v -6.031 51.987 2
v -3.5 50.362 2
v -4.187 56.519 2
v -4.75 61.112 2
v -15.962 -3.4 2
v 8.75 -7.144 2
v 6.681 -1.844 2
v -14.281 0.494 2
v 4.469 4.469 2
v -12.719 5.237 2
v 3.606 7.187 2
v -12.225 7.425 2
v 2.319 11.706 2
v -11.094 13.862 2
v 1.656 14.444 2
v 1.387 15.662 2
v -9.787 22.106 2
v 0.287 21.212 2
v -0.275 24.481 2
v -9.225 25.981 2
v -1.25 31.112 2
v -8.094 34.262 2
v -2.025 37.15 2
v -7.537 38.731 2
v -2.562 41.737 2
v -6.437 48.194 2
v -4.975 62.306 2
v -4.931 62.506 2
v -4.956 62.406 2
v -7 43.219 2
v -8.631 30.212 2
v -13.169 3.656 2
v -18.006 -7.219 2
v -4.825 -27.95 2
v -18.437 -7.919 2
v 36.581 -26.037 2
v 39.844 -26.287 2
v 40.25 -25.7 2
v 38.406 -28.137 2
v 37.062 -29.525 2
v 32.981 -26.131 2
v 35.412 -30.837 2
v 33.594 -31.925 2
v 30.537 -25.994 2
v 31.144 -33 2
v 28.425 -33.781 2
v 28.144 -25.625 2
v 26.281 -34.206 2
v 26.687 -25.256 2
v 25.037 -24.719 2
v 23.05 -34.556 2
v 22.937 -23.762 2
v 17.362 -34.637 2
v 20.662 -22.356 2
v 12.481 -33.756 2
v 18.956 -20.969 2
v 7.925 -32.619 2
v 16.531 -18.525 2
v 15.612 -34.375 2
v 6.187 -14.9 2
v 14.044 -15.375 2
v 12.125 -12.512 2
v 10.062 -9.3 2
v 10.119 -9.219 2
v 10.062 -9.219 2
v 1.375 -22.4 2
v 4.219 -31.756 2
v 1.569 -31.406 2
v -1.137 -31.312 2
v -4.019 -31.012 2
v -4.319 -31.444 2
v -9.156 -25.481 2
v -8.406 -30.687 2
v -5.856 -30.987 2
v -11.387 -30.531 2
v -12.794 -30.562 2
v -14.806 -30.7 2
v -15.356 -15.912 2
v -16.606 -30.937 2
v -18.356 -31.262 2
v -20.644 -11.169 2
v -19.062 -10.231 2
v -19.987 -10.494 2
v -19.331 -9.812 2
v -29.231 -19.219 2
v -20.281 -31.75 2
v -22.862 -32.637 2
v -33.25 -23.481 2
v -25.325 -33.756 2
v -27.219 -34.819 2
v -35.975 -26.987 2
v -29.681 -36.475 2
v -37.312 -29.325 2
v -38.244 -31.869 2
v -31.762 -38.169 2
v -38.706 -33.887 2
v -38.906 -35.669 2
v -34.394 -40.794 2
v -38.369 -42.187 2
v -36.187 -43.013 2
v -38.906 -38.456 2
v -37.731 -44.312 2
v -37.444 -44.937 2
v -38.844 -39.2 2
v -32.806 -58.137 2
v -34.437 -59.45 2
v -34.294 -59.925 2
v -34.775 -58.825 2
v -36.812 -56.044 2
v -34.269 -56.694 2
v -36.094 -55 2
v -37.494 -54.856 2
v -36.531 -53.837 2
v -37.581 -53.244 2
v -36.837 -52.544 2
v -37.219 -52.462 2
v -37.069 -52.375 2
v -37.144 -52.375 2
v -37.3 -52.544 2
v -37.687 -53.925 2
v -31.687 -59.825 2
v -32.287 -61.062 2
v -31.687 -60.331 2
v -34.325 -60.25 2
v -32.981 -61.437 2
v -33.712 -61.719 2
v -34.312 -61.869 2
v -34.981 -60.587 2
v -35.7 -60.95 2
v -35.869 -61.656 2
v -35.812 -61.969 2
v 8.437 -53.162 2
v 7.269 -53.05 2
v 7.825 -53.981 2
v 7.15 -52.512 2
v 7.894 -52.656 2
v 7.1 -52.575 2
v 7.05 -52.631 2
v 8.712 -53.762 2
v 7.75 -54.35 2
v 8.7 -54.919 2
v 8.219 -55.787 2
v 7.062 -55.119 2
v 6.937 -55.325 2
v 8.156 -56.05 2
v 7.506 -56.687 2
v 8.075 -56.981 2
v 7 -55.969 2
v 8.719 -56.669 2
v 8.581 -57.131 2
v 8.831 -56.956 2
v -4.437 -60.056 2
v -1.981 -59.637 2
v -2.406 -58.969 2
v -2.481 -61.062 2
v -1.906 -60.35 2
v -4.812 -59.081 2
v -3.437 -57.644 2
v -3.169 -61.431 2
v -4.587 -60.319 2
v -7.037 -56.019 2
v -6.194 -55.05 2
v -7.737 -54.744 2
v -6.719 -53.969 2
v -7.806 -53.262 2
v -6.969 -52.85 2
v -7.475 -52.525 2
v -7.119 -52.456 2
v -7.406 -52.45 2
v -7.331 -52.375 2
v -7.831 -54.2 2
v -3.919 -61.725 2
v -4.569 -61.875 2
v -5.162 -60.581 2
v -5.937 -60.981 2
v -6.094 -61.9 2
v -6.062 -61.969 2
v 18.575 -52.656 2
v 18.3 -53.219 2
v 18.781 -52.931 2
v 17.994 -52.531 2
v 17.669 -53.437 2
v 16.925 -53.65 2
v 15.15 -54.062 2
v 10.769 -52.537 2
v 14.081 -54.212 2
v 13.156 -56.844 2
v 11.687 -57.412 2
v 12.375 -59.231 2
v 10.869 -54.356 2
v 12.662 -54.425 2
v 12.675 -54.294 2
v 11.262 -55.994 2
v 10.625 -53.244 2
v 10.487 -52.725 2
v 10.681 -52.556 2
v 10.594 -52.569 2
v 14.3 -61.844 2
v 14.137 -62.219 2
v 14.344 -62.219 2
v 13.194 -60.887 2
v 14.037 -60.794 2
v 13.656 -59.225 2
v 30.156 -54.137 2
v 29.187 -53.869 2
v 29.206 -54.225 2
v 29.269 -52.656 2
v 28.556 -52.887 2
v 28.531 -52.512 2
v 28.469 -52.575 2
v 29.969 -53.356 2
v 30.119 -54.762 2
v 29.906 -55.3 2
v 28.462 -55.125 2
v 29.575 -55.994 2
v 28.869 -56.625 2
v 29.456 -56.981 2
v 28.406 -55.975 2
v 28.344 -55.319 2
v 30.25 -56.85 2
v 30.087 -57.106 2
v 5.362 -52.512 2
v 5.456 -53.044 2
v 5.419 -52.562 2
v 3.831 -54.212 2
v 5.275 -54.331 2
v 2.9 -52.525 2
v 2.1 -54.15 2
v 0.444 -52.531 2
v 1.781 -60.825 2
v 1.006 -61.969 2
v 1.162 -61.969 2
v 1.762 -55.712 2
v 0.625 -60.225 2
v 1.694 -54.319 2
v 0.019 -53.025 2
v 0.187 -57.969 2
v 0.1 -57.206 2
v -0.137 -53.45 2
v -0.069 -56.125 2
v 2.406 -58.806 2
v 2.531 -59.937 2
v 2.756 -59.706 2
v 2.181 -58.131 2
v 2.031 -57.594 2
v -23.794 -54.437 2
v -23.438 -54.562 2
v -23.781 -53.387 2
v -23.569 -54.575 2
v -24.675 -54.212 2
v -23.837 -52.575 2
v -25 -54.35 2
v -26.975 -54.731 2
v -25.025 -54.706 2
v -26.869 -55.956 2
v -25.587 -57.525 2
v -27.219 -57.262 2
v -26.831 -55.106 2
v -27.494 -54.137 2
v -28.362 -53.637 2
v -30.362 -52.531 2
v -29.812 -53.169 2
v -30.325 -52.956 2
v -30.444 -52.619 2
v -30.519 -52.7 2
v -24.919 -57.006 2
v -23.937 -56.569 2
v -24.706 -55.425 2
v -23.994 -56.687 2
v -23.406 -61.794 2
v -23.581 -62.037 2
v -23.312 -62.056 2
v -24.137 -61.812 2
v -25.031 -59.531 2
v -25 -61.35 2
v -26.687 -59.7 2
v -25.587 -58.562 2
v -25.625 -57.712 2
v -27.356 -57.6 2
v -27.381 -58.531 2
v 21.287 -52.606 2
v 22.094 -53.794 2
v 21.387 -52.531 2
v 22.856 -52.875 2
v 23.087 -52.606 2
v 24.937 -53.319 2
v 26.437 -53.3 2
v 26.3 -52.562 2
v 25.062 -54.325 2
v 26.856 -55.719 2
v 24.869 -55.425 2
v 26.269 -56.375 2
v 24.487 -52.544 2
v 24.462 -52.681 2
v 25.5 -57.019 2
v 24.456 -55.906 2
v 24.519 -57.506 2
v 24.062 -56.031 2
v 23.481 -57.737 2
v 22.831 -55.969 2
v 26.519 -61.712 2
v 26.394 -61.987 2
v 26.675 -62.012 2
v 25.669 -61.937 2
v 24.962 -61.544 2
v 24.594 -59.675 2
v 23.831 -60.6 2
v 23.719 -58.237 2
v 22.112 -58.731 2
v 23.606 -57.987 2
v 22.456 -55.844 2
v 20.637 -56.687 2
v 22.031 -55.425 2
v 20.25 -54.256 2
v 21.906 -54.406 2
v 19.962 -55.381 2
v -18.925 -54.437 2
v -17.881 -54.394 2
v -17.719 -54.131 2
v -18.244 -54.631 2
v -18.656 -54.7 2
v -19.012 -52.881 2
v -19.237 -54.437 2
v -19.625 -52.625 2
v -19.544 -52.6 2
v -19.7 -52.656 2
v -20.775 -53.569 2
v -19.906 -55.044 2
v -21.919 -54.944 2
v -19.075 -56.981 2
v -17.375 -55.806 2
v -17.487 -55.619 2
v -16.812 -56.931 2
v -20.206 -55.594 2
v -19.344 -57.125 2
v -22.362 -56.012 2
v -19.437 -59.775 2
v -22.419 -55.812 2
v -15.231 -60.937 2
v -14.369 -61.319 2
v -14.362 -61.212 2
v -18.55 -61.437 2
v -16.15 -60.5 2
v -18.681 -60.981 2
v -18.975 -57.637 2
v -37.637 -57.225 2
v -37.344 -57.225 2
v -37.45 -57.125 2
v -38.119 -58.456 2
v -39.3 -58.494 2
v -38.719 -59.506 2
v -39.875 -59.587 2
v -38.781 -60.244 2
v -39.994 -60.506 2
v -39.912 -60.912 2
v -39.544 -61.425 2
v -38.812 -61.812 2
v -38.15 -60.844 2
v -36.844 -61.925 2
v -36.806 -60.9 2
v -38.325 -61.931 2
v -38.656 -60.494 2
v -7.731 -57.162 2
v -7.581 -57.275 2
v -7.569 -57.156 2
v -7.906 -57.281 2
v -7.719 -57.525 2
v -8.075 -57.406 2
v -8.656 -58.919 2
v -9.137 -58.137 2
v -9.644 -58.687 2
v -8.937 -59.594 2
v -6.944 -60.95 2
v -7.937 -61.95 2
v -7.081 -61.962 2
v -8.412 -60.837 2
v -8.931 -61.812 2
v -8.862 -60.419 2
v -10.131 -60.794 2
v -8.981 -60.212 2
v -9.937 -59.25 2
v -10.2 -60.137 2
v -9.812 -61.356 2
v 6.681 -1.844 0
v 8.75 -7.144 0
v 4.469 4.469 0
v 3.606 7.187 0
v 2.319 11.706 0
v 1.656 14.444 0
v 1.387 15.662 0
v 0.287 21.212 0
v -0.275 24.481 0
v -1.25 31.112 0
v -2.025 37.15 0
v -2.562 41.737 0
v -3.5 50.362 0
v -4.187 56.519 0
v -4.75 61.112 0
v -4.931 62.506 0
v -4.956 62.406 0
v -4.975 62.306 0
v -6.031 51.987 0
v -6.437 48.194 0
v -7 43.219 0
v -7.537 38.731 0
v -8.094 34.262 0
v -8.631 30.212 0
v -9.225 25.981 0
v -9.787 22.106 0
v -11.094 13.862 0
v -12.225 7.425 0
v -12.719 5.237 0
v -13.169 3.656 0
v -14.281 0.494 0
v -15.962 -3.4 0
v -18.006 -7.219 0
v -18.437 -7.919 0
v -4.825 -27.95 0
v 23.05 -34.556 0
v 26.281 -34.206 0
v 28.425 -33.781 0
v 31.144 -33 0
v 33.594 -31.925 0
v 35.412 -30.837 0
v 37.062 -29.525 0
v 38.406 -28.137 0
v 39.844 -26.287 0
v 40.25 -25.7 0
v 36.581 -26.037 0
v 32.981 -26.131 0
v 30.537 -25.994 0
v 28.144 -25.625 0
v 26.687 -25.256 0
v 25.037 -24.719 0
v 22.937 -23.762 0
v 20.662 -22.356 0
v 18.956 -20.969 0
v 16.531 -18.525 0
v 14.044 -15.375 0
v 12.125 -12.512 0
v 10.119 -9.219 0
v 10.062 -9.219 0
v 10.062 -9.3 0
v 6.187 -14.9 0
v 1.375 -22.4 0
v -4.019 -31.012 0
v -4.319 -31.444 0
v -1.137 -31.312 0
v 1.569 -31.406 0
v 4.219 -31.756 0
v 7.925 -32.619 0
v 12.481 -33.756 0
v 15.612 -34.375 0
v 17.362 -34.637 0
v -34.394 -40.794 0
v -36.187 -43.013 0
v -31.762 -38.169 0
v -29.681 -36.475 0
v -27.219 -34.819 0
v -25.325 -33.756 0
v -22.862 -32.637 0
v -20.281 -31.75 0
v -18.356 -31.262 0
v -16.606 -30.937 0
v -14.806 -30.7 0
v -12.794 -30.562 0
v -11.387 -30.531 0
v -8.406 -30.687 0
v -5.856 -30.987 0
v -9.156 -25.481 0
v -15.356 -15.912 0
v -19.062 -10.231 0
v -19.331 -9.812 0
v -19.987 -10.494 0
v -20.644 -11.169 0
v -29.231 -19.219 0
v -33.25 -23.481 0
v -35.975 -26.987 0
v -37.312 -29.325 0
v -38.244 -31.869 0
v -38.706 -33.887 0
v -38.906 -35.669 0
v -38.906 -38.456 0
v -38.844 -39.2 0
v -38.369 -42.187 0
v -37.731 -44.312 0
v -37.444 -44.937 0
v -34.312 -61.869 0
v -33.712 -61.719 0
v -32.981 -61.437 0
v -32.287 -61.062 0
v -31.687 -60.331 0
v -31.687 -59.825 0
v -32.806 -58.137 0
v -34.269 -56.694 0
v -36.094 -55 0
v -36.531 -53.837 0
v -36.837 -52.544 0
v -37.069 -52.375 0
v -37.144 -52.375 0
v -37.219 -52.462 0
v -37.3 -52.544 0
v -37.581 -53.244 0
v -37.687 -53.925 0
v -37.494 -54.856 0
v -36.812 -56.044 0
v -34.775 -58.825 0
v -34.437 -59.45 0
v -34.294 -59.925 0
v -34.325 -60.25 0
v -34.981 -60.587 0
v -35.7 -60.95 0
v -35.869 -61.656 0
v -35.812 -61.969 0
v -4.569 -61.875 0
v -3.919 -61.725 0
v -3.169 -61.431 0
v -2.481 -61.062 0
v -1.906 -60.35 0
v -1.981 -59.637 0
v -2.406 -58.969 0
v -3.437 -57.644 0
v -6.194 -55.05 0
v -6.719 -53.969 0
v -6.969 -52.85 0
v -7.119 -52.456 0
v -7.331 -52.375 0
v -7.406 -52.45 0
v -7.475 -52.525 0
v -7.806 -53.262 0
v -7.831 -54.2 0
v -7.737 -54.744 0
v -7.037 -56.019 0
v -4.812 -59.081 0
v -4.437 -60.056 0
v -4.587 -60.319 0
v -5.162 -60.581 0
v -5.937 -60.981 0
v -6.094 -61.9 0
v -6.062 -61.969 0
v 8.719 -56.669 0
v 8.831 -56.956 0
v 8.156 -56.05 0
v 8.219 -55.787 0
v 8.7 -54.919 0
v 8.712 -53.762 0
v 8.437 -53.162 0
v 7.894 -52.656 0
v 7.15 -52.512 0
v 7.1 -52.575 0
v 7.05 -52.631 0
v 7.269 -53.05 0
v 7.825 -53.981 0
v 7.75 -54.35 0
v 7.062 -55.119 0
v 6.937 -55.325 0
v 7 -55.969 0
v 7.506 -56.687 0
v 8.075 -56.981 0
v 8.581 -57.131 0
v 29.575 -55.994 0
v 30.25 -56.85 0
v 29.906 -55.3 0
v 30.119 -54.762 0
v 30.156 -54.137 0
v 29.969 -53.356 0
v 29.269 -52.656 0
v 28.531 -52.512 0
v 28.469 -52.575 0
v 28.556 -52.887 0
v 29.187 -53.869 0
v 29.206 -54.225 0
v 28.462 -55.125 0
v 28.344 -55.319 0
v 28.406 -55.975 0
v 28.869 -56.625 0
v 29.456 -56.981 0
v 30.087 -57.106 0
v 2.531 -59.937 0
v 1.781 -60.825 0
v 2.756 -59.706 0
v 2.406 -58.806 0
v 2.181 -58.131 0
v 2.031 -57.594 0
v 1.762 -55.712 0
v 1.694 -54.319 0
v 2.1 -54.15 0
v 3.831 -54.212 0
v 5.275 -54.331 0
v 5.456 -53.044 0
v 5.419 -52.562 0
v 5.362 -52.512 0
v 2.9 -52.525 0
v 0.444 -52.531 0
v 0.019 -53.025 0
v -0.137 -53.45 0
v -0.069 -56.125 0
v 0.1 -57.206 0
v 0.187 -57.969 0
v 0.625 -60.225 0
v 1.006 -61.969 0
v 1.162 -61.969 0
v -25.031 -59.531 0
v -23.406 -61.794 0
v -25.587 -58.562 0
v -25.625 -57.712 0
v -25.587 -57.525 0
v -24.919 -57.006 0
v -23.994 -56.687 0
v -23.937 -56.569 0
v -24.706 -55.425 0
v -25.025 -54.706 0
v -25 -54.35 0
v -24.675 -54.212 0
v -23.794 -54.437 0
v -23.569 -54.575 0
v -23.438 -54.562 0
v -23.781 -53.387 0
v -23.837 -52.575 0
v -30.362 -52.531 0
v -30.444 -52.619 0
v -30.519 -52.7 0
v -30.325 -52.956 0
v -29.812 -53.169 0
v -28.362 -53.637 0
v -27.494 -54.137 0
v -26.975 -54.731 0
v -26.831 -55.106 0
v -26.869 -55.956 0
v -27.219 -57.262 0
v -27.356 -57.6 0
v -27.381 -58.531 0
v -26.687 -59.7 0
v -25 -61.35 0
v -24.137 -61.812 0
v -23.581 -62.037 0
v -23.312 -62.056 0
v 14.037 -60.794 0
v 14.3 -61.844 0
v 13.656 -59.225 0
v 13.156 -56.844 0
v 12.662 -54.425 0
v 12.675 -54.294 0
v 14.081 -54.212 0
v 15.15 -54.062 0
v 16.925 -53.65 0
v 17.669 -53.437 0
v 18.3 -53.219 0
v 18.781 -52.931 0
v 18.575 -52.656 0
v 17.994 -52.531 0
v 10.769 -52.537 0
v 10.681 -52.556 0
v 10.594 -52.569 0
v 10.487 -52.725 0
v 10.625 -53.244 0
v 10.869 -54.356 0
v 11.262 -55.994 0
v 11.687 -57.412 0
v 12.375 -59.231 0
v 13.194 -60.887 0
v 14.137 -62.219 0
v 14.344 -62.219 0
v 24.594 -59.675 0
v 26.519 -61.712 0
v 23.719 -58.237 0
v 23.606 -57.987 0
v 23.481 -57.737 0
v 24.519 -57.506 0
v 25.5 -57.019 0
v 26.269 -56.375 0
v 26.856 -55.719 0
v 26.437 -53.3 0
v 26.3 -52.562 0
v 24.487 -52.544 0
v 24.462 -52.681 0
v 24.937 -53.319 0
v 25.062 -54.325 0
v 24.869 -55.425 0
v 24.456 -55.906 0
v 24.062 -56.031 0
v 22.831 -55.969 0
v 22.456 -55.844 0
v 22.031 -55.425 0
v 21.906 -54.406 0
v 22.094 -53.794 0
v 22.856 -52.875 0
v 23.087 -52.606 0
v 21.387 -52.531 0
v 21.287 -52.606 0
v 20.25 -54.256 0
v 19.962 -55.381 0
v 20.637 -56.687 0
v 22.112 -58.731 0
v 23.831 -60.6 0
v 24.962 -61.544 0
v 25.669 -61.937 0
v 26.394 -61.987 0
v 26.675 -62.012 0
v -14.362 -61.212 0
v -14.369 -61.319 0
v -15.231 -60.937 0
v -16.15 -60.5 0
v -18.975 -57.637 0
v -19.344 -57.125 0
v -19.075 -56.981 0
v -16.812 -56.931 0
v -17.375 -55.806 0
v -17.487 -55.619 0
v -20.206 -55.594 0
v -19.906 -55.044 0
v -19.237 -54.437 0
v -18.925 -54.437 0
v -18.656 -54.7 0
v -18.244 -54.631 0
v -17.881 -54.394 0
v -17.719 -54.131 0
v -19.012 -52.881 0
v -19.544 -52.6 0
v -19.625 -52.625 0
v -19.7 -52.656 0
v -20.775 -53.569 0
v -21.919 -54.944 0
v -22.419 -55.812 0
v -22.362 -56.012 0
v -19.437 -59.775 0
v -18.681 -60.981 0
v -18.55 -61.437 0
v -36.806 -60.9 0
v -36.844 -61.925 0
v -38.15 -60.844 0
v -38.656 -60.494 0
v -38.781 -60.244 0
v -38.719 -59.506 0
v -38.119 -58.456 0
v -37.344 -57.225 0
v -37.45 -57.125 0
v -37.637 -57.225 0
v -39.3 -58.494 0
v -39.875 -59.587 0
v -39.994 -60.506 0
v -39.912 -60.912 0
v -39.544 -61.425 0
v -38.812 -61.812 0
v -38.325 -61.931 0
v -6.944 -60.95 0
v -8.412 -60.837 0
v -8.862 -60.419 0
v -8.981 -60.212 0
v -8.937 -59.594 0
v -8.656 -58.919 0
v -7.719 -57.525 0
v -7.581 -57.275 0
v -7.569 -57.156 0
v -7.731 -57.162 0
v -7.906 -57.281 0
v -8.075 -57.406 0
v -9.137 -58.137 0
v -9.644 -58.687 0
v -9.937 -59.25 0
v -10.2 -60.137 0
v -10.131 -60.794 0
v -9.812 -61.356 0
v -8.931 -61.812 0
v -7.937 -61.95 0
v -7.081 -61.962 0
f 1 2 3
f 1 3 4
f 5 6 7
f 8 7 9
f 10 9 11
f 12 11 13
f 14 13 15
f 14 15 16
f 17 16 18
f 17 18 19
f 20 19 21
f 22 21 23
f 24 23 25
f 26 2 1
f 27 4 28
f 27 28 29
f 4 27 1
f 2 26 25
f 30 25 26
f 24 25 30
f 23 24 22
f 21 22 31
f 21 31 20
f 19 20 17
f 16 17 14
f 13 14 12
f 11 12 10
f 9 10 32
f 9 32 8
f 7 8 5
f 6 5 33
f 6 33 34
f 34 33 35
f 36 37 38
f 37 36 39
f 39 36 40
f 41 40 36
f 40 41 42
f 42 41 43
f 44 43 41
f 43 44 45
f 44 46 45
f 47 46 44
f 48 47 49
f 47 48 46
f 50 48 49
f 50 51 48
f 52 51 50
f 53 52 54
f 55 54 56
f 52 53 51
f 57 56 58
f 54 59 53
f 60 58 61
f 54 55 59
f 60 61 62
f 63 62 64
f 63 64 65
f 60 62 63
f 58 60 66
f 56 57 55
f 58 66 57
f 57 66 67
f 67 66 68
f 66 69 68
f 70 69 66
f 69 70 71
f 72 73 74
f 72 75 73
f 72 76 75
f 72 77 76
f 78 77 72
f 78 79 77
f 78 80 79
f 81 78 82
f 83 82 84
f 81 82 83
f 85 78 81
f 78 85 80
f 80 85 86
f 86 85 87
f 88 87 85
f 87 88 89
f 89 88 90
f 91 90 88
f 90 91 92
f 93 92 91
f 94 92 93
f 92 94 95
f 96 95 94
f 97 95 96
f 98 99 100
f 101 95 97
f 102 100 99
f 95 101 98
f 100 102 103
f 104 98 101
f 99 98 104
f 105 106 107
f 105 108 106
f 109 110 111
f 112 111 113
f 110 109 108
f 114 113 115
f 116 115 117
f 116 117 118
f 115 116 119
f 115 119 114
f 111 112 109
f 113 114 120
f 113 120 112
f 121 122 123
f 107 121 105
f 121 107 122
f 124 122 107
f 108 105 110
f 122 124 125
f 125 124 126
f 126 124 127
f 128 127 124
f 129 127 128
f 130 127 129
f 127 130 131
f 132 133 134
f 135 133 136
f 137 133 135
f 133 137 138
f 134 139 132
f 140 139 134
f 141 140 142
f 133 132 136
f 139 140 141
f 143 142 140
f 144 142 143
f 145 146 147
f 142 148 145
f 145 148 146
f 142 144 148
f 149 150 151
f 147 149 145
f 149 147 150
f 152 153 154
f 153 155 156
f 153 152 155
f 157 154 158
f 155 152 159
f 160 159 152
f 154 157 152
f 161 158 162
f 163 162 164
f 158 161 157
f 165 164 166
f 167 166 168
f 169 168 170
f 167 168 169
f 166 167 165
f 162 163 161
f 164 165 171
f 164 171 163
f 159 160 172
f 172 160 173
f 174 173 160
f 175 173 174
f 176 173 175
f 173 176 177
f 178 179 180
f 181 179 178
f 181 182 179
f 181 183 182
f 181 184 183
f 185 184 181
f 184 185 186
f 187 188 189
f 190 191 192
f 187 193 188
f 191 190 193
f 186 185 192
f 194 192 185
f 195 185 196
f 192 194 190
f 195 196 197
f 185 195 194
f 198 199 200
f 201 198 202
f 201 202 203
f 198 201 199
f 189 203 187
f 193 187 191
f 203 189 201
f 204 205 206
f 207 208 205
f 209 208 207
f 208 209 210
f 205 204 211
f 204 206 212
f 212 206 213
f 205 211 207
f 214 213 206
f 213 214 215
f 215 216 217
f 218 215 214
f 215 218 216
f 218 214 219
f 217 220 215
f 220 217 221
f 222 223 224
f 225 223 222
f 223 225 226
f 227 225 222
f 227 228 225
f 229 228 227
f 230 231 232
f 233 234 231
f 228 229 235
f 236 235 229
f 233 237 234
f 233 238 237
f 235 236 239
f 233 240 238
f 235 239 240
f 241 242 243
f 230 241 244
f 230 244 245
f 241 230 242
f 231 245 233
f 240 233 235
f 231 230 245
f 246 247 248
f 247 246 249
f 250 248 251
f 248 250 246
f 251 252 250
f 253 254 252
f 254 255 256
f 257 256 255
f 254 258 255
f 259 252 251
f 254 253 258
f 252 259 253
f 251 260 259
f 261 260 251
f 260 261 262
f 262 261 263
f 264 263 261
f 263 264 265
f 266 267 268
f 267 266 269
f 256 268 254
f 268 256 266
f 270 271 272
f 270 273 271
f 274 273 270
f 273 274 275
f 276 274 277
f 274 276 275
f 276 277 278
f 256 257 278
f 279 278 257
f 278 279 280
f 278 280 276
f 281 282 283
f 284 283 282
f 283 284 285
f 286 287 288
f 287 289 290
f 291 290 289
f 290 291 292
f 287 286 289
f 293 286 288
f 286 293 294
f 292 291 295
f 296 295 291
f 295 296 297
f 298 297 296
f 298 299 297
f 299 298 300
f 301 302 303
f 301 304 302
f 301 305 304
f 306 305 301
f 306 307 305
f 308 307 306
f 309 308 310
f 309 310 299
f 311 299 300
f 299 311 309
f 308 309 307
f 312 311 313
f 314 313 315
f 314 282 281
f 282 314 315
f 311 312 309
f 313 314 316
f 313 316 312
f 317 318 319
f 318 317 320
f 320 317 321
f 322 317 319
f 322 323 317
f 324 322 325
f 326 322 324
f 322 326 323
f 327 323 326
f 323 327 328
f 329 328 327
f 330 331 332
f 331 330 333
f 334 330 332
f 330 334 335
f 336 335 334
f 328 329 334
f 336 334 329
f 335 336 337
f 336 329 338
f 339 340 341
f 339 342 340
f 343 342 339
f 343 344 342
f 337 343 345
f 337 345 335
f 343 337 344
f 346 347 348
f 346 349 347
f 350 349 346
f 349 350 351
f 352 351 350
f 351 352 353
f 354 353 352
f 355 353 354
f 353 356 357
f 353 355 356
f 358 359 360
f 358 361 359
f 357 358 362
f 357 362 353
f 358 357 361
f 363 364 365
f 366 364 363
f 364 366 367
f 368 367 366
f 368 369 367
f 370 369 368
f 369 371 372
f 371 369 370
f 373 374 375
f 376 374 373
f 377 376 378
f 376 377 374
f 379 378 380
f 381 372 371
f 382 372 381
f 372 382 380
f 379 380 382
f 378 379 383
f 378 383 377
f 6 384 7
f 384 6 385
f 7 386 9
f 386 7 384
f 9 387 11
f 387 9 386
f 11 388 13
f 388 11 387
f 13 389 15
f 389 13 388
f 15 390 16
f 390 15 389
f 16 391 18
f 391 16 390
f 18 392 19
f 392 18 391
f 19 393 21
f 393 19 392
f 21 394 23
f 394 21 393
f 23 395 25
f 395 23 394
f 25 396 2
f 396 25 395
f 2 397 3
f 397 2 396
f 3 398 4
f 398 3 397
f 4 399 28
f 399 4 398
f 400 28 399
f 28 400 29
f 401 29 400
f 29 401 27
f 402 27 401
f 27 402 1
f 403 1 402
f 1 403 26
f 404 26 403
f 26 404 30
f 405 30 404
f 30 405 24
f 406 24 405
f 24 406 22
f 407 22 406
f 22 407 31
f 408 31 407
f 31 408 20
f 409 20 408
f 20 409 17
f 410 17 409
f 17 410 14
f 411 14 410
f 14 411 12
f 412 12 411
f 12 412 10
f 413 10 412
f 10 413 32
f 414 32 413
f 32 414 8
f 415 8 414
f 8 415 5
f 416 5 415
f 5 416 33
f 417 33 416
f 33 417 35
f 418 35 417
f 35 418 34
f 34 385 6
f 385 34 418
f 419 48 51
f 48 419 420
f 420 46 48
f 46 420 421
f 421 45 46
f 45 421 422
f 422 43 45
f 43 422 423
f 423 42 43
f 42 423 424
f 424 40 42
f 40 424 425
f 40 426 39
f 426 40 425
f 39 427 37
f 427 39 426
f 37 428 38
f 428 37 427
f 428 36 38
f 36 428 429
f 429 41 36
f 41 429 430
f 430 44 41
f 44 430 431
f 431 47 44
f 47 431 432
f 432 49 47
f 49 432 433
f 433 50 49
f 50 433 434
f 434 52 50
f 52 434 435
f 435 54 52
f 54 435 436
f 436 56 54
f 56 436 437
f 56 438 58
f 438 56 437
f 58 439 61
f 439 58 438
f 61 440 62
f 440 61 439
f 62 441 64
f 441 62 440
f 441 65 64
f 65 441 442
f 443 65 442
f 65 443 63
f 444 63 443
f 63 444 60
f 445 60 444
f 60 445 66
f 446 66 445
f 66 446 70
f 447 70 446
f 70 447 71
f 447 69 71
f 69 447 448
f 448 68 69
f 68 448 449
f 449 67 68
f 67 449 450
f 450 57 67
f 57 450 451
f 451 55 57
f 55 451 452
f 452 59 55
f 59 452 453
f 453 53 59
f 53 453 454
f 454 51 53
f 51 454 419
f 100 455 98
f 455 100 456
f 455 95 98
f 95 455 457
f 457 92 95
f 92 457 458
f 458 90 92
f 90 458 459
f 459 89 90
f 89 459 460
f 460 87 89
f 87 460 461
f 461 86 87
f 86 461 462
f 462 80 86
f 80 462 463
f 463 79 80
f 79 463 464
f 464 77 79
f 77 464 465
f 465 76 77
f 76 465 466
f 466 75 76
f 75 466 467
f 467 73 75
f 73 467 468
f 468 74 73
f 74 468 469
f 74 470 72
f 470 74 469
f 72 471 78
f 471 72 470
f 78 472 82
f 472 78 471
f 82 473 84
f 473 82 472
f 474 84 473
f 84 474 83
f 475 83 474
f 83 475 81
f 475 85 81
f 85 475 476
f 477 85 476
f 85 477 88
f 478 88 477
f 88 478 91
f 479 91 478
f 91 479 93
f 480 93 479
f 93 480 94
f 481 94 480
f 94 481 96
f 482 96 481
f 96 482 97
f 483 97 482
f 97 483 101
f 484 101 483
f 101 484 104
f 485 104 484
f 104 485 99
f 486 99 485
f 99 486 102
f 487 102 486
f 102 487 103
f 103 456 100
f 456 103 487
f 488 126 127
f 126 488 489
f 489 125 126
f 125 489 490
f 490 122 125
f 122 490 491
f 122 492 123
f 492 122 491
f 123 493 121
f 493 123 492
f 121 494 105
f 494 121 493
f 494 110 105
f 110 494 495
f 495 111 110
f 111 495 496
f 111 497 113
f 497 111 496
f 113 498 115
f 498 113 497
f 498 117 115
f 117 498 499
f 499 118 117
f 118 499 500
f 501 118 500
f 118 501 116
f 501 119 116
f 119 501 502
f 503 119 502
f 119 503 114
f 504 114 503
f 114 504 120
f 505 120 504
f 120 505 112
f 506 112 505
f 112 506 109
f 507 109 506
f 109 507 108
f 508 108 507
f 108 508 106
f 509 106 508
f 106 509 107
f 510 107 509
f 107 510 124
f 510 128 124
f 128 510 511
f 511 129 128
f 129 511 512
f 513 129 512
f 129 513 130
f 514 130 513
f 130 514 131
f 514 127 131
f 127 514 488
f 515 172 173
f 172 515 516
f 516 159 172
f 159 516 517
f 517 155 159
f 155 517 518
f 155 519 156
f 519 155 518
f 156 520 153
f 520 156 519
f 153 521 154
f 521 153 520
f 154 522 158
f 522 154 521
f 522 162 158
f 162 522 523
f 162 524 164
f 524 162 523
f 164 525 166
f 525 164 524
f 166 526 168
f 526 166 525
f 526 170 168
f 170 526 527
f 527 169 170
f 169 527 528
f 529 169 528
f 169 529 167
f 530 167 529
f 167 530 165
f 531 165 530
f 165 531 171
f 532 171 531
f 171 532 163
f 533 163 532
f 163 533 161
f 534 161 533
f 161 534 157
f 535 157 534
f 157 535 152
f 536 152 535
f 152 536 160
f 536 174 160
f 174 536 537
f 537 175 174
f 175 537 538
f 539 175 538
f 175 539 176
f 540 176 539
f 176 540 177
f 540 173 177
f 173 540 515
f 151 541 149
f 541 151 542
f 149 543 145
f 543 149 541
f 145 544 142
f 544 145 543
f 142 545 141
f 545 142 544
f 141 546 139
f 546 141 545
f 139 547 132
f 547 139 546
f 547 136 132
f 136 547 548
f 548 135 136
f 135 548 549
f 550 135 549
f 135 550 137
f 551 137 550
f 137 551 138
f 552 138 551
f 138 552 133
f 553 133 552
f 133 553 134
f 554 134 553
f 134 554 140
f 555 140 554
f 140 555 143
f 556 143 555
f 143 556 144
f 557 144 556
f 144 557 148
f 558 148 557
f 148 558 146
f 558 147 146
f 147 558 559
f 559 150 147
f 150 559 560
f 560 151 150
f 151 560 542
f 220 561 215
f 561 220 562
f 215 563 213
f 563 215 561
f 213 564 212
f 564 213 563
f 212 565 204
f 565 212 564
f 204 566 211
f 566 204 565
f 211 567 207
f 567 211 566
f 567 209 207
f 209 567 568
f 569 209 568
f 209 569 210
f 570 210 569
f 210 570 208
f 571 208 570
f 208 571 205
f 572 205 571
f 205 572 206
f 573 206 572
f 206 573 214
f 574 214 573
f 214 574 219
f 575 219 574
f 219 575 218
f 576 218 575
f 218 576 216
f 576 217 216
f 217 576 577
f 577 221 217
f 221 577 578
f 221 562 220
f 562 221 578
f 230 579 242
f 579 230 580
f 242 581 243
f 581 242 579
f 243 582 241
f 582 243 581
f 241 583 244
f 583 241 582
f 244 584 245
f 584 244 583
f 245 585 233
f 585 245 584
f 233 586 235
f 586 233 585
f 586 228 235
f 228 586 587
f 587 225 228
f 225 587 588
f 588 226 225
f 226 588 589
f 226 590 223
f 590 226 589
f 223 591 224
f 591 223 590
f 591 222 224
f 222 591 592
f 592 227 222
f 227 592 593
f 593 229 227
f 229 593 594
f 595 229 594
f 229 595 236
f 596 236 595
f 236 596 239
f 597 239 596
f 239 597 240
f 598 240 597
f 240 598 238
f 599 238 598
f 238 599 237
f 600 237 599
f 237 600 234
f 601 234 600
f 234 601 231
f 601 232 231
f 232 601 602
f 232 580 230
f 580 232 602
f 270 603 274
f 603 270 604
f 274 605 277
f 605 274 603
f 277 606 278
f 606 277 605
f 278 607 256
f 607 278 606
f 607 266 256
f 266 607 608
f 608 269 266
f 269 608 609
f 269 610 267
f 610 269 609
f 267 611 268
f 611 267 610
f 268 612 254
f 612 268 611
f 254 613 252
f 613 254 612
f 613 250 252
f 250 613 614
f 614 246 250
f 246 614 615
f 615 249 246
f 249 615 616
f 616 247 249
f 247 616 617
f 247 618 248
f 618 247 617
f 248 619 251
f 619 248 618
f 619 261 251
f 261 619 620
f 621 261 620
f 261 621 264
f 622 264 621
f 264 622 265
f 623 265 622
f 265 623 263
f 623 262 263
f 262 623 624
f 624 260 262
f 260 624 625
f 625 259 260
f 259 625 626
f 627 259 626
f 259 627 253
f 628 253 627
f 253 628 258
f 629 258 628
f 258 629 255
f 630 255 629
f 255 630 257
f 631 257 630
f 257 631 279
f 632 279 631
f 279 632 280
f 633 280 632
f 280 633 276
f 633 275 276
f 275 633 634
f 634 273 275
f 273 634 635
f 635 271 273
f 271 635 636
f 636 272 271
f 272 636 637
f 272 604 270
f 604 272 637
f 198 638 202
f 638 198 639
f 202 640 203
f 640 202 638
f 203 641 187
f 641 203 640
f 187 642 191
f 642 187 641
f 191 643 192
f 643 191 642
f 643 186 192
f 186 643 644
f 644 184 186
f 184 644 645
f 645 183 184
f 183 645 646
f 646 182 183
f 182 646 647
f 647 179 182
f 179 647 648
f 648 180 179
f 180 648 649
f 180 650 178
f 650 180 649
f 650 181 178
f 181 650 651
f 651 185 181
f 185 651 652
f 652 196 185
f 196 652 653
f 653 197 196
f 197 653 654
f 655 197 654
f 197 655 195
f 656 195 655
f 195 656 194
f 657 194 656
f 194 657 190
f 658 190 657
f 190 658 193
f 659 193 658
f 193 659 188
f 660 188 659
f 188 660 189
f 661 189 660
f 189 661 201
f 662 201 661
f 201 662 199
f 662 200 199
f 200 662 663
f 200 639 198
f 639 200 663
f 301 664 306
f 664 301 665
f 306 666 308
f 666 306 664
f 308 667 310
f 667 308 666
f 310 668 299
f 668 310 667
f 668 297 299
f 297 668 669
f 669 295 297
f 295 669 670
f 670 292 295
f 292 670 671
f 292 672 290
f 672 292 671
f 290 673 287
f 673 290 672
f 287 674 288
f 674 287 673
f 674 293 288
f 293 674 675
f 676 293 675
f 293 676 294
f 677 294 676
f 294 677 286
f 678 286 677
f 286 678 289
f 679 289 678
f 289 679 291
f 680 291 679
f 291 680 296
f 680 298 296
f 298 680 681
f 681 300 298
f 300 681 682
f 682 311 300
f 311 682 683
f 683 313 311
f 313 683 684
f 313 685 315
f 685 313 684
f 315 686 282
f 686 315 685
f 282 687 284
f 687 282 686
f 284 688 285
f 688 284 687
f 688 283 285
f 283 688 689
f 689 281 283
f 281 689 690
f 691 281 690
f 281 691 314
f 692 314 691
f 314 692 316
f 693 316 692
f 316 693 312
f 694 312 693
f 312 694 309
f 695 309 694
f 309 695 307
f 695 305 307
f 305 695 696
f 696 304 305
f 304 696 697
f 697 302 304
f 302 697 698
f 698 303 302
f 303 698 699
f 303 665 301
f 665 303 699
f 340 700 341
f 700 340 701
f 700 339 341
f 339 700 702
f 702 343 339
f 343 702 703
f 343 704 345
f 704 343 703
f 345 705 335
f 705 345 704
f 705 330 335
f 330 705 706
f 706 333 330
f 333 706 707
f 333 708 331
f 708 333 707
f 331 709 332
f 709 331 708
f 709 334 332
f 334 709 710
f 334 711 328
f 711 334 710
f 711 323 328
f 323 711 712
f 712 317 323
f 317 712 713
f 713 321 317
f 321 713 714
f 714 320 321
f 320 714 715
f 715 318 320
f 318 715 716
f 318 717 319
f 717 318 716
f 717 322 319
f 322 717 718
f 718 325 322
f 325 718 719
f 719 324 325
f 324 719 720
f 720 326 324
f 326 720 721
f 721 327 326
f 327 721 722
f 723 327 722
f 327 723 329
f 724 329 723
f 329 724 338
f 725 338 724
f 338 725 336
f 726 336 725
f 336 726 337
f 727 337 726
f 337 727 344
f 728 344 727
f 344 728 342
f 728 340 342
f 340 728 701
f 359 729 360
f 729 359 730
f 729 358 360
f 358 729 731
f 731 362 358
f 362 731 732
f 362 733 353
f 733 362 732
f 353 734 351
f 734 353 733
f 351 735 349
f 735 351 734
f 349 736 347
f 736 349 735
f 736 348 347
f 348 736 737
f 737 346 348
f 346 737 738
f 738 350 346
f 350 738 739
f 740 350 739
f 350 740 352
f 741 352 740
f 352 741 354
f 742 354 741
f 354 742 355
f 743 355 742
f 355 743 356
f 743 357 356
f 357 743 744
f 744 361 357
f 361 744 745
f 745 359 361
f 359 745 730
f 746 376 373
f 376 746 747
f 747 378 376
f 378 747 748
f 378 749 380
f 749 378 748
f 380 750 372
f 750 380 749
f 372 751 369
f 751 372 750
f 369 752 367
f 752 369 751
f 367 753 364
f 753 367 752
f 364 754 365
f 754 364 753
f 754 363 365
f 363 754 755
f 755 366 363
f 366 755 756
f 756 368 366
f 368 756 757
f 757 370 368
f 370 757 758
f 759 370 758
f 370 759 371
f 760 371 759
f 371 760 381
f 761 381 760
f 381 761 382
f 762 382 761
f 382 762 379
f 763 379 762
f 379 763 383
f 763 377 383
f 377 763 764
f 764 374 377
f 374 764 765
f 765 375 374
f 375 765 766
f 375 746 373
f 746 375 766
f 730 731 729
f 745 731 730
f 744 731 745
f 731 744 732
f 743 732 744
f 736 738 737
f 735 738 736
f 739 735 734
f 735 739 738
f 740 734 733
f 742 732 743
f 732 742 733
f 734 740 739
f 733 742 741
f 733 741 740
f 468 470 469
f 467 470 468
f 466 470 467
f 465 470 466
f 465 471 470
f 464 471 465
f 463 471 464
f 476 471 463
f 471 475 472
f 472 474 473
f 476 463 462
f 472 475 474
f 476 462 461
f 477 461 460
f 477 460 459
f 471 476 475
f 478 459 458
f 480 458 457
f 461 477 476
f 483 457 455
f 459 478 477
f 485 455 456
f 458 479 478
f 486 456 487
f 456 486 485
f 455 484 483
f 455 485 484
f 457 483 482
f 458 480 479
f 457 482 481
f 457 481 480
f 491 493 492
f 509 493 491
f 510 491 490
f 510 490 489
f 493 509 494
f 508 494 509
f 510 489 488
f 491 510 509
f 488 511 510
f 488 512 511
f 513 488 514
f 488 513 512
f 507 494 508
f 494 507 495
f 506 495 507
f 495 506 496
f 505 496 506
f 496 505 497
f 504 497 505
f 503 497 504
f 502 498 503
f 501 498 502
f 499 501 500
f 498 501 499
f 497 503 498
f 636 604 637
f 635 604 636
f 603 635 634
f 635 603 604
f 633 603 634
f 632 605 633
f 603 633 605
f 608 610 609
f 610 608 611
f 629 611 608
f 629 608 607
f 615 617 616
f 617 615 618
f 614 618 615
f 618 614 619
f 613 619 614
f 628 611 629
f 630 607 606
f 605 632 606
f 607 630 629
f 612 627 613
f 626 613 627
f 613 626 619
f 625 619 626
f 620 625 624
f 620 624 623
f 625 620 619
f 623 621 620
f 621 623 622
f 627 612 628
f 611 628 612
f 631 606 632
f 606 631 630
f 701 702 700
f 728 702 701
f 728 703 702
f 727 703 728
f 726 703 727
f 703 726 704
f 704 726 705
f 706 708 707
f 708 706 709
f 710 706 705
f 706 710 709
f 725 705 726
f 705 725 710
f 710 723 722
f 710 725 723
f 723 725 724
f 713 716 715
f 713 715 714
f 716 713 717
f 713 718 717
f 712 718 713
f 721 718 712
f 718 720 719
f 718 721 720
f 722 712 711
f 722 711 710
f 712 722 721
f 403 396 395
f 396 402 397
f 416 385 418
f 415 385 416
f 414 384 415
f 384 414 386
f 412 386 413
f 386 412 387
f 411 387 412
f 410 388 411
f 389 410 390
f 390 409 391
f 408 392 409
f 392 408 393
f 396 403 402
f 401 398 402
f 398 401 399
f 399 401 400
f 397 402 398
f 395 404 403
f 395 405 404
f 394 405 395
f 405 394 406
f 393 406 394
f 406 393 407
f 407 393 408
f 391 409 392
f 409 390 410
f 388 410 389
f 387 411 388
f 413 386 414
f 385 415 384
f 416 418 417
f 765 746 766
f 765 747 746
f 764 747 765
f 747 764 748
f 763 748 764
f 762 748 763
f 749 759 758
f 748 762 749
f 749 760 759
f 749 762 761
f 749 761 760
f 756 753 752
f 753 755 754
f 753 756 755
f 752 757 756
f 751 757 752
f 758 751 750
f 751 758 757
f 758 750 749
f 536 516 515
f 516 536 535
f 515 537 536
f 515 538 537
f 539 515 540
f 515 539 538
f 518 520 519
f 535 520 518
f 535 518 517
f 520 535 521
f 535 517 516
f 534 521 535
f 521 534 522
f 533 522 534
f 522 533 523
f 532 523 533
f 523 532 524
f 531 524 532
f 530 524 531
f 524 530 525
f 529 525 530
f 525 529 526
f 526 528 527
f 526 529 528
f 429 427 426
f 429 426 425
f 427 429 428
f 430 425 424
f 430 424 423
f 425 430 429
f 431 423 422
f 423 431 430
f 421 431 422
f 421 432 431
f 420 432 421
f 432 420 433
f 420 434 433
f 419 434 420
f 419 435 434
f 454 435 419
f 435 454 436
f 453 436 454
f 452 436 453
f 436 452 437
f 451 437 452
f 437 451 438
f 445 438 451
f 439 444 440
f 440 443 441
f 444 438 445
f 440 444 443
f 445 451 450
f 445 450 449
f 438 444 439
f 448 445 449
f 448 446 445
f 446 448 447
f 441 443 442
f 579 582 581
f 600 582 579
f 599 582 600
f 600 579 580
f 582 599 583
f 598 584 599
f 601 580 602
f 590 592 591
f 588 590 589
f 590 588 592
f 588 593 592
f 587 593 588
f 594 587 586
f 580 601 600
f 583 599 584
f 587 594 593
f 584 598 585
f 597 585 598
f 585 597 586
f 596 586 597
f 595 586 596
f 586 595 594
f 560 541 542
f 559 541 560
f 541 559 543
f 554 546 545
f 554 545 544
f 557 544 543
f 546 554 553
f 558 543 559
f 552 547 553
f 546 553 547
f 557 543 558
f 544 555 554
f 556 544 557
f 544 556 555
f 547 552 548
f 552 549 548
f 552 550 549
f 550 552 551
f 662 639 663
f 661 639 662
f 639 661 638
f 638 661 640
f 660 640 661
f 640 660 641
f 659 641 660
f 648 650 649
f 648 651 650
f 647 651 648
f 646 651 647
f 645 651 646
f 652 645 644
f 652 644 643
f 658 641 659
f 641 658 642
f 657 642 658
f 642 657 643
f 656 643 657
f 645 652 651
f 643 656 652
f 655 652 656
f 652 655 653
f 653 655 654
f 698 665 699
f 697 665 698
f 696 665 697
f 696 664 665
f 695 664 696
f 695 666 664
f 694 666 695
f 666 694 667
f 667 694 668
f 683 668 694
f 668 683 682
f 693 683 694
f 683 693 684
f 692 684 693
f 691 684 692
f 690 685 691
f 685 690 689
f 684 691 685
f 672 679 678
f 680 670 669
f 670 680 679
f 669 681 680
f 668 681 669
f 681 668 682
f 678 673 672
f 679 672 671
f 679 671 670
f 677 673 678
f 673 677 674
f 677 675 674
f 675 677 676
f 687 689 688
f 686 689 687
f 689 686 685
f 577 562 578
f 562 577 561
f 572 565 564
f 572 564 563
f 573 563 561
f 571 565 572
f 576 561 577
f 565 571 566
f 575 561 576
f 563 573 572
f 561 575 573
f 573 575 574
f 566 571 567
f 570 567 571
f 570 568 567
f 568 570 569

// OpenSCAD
module 8d1b90d4c00c4f05822c5b2b373ec08c_1()
{
 /* Generated by trace2scad version 20150415
    http://aggregate.org/MAKE/TRACE2SCAD/
    Optimized model has 387/4796 original points
 */
 color([0.48, 0.48, 0.48])
 assign(minx=0) /* polygon minx=39 */
 assign(miny=0) /* polygon miny=45 */
 assign(maxx=12880) /* polygon maxx=12880 */
 assign(maxy=20000) /* polygon maxy=20001 */
 assign(dx=maxx-minx)
 assign(dy=maxy-miny)
 assign(maxd=((dx>dy)?dx:dy))
 scale([1/maxd, 1/maxd, 1])
 translate([-minx-dx/2, -miny-dy/2, 0])
 linear_extrude(height=1, convexity=387)
 union() {
  union() {
   polygon([[5647,19985],[5644,19969],[5475,18318],[5410,17711],[5320,16915],[5234,16197],[5145,15482],[5059,14834],[4964,14157],[4874,13537],[4665,12218],[4484,11188],[4405,10838],[4333,10585],[4155,10079],[3886,9456],[3559,8845],[3490,8733],[5668,5528],[7840,8857],[7509,9705],[7155,10715],[7017,11150],[6811,11873],[6705,12311],[6662,12506],[6486,13394],[6396,13917],[6240,14978],[6116,15944],[6030,16678],[5880,18058],[5770,19043],[5680,19778],[5651,20001]], convexity=6);
   polygon([[8050,8518],[8050,8512],[7430,7616],[6660,6416],[5797,5038],[5749,4969],[6258,4990],[6691,4975],[7115,4919],[7708,4781],[8437,4599],[8938,4500],[9218,4458],[10128,4471],[10645,4527],[10988,4595],[11423,4720],[11815,4892],[12106,5066],[12370,5276],[12585,5498],[12815,5794],[12880,5888],[12293,5834],[11717,5819],[11326,5841],[10943,5900],[10710,5959],[10446,6045],[10110,6198],[9746,6423],[9473,6645],[9085,7036],[8687,7540],[8380,7998],[8059,8525],[8050,8525]], convexity=9);
   polygon([[3242,8321],[3137,8213],[1763,6925],[1120,6243],[684,5682],[470,5308],[321,4901],[247,4578],[215,4293],[215,3847],[225,3728],[301,3250],[403,2910],[449,2810],[650,3118],[937,3473],[1358,3893],[1691,4164],[2085,4429],[2388,4599],[2782,4778],[3195,4920],[3503,4998],[3783,5050],[4071,5088],[4393,5110],[4618,5115],[5095,5090],[5503,5042],[4975,5923],[3983,7454],[3390,8363],[3347,8430]], convexity=7);
   polygon([[485,1606],[472,1593],[427,1481],[410,1372],[441,1223],[550,1033],[876,588],[930,488],[953,412],[948,360],[843,306],[728,248],[701,135],[710,85],[950,101],[1046,125],[1163,170],[1274,230],[1370,347],[1370,428],[1191,698],[957,929],[665,1200],[595,1386],[546,1593],[509,1620],[497,1620]], convexity=8);
   polygon([[5255,1608],[5244,1596],[5191,1478],[5187,1328],[5202,1241],[5314,1037],[5670,547],[5730,391],[5706,349],[5614,307],[5490,243],[5465,96],[5470,85],[5709,100],[5813,124],[5933,171],[6043,230],[6135,344],[6123,458],[6055,565],[5890,777],[5449,1192],[5365,1365],[5325,1544],[5301,1607],[5267,1620]], convexity=8);
   polygon([[6904,1596],[6511,1595],[6443,1516],[6418,1448],[6429,1020],[6456,847],[6470,725],[6540,364],[6601,85],[6626,85],[6725,268],[6845,410],[6881,447],[6825,591],[6789,699],[6765,785],[6722,1086],[6711,1309],[6776,1336],[7053,1326],[7284,1307],[7313,1513],[7307,1590],[7298,1598]], convexity=10);
   polygon([[7576,1588],[7568,1579],[7603,1512],[7692,1363],[7680,1304],[7570,1181],[7550,1148],[7560,1045],[7641,930],[7732,883],[7813,859],[7853,887],[7835,933],[7745,1032],[7755,1074],[7832,1213],[7834,1398],[7790,1494],[7703,1575],[7584,1598]], convexity=10);
   polygon([[11000,1593],[10995,1588],[11009,1538],[11110,1381],[11113,1324],[10994,1180],[10975,1149],[10985,1044],[11059,940],[11153,883],[11254,863],[11280,904],[11172,1041],[11225,1152],[11259,1238],[11265,1338],[11235,1463],[11123,1575],[11005,1598]], convexity=10);
   polygon([[1569,1581],[1557,1568],[1588,1527],[1670,1493],[1902,1418],[2041,1338],[2124,1243],[2147,1183],[2141,1047],[2085,838],[2063,784],[2059,635],[2170,448],[2440,184],[2578,110],[2667,74],[2710,71],[2695,113],[2435,475],[2346,630],[2340,766],[2346,796],[2453,879],[2601,930],[2610,949],[2487,1132],[2436,1247],[2440,1304],[2492,1326],[2633,1290],[2669,1268],[2690,1270],[2635,1458],[2626,1588],[1582,1595]], convexity=13);
   polygon([[8149,1591],[8135,1589],[8118,1564],[8140,1481],[8179,1303],[8242,1041],[8310,814],[8420,523],[8551,258],[8702,45],[8735,45],[8728,105],[8686,273],[8625,524],[8545,905],[8466,1292],[8468,1313],[8693,1326],[8864,1350],[9148,1416],[9267,1450],[9368,1485],[9445,1531],[9412,1575],[9319,1595],[8163,1594]], convexity=9);
   polygon([[9854,1589],[9846,1583],[9680,1319],[9634,1139],[9742,930],[9978,603],[10253,304],[10434,153],[10547,90],[10663,82],[10708,78],[10683,126],[10375,452],[10235,682],[10217,722],[10197,762],[10363,799],[10520,877],[10643,980],[10737,1085],[10670,1472],[10648,1590],[10358,1593],[10354,1571],[10430,1469],[10450,1308],[10419,1132],[10353,1055],[10290,1035],[10093,1045],[10033,1065],[9965,1132],[9945,1295],[9975,1393],[10097,1540],[10134,1583],[9862,1595]], convexity=13);
   polygon([[3300,1580],[3288,1575],[3116,1429],[2933,1209],[2853,1070],[2862,1038],[3330,436],[3451,243],[3472,170],[4141,189],[4142,206],[4003,250],[3856,320],[3404,778],[3345,860],[3388,883],[3750,891],[3660,1071],[3642,1101],[3207,1105],[3255,1193],[3362,1290],[3412,1290],[3455,1248],[3521,1259],[3579,1297],[3605,1339],[3398,1539],[3313,1584]], convexity=12);
   polygon([[433,852],[418,844],[152,641],[60,466],[41,319],[54,254],[113,172],[230,110],[308,91],[545,92],[551,256],[336,265],[255,321],[235,361],[245,479],[341,647],[465,844],[448,860]], convexity=8);
   polygon([[5175,835],[5148,815],[4978,698],[4897,610],[4850,520],[4808,378],[4819,273],[4870,183],[5011,110],[5170,88],[5307,86],[5329,248],[5094,266],[5022,333],[5003,366],[5010,465],[5055,573],[5205,796],[5227,836],[5229,855],[5203,854]], convexity=8);
  }
 }
}

module 8d1b90d4c00c4f05822c5b2b373ec08c()
{
 /* all layers combined, scaled to within a 1mm cube */
 scale([1, 1, 1/1])
 difference() {
  union() {
   scale([1,1,2]) translate([0,0,-0.5]) 8d1b90d4c00c4f05822c5b2b373ec08c_1();
  }
  translate([0,0,-2]) cube([2,2,4],center=true);
 }
}

scale([125, 125, 2]) {
	8d1b90d4c00c4f05822c5b2b373ec08c();
}
